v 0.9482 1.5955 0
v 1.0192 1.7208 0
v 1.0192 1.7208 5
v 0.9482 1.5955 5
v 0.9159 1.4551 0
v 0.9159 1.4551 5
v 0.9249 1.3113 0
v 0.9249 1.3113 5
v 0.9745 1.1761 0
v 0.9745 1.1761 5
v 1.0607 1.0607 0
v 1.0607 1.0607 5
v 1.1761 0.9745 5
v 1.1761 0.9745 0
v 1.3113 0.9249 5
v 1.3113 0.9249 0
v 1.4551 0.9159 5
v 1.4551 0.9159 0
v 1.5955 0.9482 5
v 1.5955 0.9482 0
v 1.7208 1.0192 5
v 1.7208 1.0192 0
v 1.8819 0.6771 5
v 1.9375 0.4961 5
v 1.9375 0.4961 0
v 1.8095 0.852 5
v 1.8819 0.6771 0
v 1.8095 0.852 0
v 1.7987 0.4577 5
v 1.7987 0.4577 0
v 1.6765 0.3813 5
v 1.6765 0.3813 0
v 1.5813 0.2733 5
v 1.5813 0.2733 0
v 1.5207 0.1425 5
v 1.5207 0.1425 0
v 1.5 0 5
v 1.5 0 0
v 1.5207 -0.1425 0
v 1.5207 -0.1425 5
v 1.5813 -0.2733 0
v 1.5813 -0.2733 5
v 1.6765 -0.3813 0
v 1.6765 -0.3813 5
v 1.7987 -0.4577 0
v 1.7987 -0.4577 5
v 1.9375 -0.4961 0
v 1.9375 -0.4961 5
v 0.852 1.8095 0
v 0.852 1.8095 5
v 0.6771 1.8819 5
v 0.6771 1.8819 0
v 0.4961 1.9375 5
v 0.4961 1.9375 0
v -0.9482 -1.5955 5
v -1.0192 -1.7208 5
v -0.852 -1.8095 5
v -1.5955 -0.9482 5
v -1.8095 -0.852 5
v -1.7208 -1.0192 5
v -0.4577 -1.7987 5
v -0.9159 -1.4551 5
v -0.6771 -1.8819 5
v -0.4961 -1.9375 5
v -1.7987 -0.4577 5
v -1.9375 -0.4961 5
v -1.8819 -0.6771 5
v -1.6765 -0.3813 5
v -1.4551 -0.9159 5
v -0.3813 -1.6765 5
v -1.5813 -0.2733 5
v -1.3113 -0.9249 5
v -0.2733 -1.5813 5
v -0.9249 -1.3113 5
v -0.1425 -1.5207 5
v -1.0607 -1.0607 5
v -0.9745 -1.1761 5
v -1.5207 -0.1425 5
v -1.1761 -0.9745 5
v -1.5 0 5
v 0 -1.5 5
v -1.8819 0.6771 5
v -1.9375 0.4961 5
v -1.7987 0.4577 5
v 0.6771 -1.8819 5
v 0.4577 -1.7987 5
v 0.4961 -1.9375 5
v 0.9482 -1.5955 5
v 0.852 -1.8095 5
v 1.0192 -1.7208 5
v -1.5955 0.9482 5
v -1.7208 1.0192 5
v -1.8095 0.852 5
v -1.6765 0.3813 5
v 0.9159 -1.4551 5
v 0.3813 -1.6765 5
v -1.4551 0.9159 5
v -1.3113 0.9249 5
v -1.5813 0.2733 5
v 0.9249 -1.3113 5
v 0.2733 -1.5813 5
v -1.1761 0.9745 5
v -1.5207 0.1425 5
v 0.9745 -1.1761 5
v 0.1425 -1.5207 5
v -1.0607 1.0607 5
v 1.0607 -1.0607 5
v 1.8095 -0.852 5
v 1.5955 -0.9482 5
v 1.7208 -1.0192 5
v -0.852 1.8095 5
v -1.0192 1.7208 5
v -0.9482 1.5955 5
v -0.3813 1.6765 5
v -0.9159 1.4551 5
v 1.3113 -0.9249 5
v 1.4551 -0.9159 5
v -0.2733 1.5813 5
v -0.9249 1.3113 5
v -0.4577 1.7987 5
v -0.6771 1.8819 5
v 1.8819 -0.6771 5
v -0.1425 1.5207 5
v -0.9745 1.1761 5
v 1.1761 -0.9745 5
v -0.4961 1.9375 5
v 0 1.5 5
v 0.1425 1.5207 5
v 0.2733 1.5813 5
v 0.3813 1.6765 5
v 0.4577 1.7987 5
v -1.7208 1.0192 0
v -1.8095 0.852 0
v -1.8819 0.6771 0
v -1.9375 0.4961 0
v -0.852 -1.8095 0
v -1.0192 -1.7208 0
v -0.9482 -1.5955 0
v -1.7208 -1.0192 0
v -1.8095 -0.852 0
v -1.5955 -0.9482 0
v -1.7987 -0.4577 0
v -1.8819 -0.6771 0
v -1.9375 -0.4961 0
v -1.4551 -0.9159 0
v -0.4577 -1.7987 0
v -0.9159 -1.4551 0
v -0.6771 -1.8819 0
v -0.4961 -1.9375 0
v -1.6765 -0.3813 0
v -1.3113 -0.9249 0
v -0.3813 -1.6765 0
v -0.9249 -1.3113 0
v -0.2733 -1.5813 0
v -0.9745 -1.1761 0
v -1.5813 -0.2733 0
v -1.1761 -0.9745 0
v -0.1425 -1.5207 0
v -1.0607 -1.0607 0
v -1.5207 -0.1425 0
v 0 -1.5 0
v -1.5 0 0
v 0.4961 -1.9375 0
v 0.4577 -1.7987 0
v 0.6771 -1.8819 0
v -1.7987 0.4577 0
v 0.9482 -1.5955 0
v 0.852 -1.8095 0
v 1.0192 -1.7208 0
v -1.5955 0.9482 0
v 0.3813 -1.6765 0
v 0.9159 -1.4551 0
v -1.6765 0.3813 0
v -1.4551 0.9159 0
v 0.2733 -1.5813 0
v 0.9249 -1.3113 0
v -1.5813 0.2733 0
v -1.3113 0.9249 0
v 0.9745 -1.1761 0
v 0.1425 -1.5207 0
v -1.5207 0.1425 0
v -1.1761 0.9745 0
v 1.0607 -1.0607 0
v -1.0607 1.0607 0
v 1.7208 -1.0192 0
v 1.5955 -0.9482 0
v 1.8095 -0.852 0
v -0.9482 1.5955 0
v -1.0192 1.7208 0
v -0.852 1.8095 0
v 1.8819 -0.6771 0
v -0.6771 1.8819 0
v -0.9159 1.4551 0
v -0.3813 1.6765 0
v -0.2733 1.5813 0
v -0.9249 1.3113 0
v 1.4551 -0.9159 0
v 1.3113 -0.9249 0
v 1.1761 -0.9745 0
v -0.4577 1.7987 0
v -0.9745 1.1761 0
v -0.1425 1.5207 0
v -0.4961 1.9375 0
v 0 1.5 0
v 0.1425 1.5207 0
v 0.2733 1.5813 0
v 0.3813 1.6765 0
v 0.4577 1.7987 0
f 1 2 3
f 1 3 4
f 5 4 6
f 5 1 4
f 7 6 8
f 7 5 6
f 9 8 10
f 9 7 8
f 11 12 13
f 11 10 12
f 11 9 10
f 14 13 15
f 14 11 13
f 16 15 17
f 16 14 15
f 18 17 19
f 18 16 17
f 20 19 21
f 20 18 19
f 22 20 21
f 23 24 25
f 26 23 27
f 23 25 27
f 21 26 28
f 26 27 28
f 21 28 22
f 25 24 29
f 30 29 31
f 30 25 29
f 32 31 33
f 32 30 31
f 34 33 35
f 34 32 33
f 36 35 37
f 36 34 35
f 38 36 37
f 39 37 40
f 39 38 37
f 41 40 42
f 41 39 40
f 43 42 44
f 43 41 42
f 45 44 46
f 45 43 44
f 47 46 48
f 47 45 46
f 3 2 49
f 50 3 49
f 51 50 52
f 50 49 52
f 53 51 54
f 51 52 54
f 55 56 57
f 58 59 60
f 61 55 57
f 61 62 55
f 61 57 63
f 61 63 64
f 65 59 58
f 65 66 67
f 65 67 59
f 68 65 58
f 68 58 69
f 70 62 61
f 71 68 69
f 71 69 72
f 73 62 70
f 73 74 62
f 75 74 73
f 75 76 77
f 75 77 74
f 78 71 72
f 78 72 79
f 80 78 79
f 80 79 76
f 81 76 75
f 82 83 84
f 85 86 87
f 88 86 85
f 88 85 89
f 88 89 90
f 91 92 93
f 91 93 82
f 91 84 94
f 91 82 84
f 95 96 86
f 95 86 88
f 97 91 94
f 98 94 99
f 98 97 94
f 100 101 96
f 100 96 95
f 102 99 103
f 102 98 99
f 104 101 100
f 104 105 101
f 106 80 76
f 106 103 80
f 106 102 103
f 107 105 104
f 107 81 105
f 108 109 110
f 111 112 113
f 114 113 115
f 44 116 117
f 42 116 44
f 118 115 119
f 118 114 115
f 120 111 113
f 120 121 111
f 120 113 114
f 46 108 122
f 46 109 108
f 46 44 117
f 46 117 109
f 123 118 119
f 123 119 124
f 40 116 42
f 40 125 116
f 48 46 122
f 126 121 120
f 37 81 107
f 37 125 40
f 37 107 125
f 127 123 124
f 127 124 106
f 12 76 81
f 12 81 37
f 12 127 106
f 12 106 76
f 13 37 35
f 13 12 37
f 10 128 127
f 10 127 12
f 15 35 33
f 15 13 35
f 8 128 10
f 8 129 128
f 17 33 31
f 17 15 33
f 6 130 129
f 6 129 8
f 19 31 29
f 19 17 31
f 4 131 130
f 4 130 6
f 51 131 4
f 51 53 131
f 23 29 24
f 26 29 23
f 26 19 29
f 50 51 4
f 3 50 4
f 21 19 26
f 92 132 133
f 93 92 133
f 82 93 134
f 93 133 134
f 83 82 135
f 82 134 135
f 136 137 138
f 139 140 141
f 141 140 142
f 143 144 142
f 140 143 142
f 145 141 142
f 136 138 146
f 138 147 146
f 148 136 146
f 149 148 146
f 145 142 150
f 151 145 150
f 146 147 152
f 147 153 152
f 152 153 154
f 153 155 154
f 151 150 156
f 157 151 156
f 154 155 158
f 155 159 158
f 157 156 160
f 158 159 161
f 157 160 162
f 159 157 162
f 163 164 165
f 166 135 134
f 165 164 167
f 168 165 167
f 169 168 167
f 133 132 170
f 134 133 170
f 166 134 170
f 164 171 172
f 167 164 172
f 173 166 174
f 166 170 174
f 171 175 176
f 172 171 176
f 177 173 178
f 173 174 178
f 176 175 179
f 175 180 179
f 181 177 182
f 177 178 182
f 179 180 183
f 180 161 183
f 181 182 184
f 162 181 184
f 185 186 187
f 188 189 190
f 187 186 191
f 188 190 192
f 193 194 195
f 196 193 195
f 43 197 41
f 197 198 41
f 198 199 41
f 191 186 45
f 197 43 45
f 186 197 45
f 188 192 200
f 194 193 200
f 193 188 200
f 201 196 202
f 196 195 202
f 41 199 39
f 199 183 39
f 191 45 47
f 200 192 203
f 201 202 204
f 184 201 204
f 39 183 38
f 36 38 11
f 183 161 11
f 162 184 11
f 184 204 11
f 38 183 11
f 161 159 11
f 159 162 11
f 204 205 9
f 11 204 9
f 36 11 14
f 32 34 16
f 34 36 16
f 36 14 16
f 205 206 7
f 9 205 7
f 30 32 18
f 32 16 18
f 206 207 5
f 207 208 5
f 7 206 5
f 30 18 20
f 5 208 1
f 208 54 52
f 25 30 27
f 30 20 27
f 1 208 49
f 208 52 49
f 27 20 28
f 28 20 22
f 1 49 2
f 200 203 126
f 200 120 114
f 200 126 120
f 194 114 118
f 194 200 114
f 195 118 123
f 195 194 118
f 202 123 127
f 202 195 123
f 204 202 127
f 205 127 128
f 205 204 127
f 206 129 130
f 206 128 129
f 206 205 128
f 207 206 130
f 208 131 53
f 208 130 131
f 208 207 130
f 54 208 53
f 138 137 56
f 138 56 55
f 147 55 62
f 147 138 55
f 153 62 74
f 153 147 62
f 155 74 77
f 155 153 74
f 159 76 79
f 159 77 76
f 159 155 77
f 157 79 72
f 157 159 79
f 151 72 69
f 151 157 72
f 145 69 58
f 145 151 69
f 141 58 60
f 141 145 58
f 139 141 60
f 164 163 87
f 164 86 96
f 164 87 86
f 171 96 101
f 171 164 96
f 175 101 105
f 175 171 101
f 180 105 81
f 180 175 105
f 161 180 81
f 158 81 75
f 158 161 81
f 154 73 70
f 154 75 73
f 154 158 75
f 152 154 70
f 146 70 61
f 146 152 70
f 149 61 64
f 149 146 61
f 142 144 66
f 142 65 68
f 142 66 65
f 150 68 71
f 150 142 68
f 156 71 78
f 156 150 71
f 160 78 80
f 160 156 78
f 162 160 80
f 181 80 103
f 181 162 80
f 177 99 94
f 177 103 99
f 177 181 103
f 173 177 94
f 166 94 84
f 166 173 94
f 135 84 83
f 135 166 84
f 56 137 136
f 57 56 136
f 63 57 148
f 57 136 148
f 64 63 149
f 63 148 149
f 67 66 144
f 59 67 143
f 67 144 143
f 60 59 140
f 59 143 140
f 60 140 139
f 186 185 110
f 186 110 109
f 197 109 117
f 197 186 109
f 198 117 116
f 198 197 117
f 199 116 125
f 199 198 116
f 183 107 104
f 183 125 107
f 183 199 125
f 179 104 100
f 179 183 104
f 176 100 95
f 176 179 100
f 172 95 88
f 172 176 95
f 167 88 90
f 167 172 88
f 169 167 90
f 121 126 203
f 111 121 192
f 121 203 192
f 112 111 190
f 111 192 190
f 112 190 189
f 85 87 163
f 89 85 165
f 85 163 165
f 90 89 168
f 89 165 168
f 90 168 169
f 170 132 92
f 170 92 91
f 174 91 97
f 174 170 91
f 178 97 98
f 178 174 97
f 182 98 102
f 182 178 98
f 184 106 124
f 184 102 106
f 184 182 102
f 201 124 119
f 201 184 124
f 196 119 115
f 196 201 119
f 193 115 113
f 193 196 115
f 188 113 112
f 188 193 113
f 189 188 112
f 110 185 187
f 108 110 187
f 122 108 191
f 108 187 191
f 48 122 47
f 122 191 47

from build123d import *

# Parameters (mm, degrees)
CYLINDER001_R     = 0.5
CYLINDER001_DEPTH = 10
ARRAY_COUNT       = 8
CYLINDER_R        = 2
CYLINDER_DEPTH    = 5


with BuildPart() as array:
    # Cylinder001 → Cylinder001 (new body)
    with BuildSketch(Plane(origin=(2, 0, 0), x_dir=(1, 0, 0), z_dir=(0, 0, 1))):
        Circle(CYLINDER001_R)
    extrude(amount=CYLINDER001_DEPTH)

    # Array: Array ×8 about axis
    array_axis = Axis((0, 0, 0), (0, 0, 1))


with BuildPart() as array_1:
    add(array.part)
    for i in range(1, ARRAY_COUNT):
        add(array.part.rotate(array_axis, i * 360 / ARRAY_COUNT))


with BuildPart() as cut:
    # Cylinder → Cylinder (new body)
    with BuildSketch(Plane.XY):
        Circle(CYLINDER_R)
    extrude(amount=CYLINDER_DEPTH)

    # Cut: cut Array
    add(array_1.part, mode=Mode.SUBTRACT)


solid = cut.part
